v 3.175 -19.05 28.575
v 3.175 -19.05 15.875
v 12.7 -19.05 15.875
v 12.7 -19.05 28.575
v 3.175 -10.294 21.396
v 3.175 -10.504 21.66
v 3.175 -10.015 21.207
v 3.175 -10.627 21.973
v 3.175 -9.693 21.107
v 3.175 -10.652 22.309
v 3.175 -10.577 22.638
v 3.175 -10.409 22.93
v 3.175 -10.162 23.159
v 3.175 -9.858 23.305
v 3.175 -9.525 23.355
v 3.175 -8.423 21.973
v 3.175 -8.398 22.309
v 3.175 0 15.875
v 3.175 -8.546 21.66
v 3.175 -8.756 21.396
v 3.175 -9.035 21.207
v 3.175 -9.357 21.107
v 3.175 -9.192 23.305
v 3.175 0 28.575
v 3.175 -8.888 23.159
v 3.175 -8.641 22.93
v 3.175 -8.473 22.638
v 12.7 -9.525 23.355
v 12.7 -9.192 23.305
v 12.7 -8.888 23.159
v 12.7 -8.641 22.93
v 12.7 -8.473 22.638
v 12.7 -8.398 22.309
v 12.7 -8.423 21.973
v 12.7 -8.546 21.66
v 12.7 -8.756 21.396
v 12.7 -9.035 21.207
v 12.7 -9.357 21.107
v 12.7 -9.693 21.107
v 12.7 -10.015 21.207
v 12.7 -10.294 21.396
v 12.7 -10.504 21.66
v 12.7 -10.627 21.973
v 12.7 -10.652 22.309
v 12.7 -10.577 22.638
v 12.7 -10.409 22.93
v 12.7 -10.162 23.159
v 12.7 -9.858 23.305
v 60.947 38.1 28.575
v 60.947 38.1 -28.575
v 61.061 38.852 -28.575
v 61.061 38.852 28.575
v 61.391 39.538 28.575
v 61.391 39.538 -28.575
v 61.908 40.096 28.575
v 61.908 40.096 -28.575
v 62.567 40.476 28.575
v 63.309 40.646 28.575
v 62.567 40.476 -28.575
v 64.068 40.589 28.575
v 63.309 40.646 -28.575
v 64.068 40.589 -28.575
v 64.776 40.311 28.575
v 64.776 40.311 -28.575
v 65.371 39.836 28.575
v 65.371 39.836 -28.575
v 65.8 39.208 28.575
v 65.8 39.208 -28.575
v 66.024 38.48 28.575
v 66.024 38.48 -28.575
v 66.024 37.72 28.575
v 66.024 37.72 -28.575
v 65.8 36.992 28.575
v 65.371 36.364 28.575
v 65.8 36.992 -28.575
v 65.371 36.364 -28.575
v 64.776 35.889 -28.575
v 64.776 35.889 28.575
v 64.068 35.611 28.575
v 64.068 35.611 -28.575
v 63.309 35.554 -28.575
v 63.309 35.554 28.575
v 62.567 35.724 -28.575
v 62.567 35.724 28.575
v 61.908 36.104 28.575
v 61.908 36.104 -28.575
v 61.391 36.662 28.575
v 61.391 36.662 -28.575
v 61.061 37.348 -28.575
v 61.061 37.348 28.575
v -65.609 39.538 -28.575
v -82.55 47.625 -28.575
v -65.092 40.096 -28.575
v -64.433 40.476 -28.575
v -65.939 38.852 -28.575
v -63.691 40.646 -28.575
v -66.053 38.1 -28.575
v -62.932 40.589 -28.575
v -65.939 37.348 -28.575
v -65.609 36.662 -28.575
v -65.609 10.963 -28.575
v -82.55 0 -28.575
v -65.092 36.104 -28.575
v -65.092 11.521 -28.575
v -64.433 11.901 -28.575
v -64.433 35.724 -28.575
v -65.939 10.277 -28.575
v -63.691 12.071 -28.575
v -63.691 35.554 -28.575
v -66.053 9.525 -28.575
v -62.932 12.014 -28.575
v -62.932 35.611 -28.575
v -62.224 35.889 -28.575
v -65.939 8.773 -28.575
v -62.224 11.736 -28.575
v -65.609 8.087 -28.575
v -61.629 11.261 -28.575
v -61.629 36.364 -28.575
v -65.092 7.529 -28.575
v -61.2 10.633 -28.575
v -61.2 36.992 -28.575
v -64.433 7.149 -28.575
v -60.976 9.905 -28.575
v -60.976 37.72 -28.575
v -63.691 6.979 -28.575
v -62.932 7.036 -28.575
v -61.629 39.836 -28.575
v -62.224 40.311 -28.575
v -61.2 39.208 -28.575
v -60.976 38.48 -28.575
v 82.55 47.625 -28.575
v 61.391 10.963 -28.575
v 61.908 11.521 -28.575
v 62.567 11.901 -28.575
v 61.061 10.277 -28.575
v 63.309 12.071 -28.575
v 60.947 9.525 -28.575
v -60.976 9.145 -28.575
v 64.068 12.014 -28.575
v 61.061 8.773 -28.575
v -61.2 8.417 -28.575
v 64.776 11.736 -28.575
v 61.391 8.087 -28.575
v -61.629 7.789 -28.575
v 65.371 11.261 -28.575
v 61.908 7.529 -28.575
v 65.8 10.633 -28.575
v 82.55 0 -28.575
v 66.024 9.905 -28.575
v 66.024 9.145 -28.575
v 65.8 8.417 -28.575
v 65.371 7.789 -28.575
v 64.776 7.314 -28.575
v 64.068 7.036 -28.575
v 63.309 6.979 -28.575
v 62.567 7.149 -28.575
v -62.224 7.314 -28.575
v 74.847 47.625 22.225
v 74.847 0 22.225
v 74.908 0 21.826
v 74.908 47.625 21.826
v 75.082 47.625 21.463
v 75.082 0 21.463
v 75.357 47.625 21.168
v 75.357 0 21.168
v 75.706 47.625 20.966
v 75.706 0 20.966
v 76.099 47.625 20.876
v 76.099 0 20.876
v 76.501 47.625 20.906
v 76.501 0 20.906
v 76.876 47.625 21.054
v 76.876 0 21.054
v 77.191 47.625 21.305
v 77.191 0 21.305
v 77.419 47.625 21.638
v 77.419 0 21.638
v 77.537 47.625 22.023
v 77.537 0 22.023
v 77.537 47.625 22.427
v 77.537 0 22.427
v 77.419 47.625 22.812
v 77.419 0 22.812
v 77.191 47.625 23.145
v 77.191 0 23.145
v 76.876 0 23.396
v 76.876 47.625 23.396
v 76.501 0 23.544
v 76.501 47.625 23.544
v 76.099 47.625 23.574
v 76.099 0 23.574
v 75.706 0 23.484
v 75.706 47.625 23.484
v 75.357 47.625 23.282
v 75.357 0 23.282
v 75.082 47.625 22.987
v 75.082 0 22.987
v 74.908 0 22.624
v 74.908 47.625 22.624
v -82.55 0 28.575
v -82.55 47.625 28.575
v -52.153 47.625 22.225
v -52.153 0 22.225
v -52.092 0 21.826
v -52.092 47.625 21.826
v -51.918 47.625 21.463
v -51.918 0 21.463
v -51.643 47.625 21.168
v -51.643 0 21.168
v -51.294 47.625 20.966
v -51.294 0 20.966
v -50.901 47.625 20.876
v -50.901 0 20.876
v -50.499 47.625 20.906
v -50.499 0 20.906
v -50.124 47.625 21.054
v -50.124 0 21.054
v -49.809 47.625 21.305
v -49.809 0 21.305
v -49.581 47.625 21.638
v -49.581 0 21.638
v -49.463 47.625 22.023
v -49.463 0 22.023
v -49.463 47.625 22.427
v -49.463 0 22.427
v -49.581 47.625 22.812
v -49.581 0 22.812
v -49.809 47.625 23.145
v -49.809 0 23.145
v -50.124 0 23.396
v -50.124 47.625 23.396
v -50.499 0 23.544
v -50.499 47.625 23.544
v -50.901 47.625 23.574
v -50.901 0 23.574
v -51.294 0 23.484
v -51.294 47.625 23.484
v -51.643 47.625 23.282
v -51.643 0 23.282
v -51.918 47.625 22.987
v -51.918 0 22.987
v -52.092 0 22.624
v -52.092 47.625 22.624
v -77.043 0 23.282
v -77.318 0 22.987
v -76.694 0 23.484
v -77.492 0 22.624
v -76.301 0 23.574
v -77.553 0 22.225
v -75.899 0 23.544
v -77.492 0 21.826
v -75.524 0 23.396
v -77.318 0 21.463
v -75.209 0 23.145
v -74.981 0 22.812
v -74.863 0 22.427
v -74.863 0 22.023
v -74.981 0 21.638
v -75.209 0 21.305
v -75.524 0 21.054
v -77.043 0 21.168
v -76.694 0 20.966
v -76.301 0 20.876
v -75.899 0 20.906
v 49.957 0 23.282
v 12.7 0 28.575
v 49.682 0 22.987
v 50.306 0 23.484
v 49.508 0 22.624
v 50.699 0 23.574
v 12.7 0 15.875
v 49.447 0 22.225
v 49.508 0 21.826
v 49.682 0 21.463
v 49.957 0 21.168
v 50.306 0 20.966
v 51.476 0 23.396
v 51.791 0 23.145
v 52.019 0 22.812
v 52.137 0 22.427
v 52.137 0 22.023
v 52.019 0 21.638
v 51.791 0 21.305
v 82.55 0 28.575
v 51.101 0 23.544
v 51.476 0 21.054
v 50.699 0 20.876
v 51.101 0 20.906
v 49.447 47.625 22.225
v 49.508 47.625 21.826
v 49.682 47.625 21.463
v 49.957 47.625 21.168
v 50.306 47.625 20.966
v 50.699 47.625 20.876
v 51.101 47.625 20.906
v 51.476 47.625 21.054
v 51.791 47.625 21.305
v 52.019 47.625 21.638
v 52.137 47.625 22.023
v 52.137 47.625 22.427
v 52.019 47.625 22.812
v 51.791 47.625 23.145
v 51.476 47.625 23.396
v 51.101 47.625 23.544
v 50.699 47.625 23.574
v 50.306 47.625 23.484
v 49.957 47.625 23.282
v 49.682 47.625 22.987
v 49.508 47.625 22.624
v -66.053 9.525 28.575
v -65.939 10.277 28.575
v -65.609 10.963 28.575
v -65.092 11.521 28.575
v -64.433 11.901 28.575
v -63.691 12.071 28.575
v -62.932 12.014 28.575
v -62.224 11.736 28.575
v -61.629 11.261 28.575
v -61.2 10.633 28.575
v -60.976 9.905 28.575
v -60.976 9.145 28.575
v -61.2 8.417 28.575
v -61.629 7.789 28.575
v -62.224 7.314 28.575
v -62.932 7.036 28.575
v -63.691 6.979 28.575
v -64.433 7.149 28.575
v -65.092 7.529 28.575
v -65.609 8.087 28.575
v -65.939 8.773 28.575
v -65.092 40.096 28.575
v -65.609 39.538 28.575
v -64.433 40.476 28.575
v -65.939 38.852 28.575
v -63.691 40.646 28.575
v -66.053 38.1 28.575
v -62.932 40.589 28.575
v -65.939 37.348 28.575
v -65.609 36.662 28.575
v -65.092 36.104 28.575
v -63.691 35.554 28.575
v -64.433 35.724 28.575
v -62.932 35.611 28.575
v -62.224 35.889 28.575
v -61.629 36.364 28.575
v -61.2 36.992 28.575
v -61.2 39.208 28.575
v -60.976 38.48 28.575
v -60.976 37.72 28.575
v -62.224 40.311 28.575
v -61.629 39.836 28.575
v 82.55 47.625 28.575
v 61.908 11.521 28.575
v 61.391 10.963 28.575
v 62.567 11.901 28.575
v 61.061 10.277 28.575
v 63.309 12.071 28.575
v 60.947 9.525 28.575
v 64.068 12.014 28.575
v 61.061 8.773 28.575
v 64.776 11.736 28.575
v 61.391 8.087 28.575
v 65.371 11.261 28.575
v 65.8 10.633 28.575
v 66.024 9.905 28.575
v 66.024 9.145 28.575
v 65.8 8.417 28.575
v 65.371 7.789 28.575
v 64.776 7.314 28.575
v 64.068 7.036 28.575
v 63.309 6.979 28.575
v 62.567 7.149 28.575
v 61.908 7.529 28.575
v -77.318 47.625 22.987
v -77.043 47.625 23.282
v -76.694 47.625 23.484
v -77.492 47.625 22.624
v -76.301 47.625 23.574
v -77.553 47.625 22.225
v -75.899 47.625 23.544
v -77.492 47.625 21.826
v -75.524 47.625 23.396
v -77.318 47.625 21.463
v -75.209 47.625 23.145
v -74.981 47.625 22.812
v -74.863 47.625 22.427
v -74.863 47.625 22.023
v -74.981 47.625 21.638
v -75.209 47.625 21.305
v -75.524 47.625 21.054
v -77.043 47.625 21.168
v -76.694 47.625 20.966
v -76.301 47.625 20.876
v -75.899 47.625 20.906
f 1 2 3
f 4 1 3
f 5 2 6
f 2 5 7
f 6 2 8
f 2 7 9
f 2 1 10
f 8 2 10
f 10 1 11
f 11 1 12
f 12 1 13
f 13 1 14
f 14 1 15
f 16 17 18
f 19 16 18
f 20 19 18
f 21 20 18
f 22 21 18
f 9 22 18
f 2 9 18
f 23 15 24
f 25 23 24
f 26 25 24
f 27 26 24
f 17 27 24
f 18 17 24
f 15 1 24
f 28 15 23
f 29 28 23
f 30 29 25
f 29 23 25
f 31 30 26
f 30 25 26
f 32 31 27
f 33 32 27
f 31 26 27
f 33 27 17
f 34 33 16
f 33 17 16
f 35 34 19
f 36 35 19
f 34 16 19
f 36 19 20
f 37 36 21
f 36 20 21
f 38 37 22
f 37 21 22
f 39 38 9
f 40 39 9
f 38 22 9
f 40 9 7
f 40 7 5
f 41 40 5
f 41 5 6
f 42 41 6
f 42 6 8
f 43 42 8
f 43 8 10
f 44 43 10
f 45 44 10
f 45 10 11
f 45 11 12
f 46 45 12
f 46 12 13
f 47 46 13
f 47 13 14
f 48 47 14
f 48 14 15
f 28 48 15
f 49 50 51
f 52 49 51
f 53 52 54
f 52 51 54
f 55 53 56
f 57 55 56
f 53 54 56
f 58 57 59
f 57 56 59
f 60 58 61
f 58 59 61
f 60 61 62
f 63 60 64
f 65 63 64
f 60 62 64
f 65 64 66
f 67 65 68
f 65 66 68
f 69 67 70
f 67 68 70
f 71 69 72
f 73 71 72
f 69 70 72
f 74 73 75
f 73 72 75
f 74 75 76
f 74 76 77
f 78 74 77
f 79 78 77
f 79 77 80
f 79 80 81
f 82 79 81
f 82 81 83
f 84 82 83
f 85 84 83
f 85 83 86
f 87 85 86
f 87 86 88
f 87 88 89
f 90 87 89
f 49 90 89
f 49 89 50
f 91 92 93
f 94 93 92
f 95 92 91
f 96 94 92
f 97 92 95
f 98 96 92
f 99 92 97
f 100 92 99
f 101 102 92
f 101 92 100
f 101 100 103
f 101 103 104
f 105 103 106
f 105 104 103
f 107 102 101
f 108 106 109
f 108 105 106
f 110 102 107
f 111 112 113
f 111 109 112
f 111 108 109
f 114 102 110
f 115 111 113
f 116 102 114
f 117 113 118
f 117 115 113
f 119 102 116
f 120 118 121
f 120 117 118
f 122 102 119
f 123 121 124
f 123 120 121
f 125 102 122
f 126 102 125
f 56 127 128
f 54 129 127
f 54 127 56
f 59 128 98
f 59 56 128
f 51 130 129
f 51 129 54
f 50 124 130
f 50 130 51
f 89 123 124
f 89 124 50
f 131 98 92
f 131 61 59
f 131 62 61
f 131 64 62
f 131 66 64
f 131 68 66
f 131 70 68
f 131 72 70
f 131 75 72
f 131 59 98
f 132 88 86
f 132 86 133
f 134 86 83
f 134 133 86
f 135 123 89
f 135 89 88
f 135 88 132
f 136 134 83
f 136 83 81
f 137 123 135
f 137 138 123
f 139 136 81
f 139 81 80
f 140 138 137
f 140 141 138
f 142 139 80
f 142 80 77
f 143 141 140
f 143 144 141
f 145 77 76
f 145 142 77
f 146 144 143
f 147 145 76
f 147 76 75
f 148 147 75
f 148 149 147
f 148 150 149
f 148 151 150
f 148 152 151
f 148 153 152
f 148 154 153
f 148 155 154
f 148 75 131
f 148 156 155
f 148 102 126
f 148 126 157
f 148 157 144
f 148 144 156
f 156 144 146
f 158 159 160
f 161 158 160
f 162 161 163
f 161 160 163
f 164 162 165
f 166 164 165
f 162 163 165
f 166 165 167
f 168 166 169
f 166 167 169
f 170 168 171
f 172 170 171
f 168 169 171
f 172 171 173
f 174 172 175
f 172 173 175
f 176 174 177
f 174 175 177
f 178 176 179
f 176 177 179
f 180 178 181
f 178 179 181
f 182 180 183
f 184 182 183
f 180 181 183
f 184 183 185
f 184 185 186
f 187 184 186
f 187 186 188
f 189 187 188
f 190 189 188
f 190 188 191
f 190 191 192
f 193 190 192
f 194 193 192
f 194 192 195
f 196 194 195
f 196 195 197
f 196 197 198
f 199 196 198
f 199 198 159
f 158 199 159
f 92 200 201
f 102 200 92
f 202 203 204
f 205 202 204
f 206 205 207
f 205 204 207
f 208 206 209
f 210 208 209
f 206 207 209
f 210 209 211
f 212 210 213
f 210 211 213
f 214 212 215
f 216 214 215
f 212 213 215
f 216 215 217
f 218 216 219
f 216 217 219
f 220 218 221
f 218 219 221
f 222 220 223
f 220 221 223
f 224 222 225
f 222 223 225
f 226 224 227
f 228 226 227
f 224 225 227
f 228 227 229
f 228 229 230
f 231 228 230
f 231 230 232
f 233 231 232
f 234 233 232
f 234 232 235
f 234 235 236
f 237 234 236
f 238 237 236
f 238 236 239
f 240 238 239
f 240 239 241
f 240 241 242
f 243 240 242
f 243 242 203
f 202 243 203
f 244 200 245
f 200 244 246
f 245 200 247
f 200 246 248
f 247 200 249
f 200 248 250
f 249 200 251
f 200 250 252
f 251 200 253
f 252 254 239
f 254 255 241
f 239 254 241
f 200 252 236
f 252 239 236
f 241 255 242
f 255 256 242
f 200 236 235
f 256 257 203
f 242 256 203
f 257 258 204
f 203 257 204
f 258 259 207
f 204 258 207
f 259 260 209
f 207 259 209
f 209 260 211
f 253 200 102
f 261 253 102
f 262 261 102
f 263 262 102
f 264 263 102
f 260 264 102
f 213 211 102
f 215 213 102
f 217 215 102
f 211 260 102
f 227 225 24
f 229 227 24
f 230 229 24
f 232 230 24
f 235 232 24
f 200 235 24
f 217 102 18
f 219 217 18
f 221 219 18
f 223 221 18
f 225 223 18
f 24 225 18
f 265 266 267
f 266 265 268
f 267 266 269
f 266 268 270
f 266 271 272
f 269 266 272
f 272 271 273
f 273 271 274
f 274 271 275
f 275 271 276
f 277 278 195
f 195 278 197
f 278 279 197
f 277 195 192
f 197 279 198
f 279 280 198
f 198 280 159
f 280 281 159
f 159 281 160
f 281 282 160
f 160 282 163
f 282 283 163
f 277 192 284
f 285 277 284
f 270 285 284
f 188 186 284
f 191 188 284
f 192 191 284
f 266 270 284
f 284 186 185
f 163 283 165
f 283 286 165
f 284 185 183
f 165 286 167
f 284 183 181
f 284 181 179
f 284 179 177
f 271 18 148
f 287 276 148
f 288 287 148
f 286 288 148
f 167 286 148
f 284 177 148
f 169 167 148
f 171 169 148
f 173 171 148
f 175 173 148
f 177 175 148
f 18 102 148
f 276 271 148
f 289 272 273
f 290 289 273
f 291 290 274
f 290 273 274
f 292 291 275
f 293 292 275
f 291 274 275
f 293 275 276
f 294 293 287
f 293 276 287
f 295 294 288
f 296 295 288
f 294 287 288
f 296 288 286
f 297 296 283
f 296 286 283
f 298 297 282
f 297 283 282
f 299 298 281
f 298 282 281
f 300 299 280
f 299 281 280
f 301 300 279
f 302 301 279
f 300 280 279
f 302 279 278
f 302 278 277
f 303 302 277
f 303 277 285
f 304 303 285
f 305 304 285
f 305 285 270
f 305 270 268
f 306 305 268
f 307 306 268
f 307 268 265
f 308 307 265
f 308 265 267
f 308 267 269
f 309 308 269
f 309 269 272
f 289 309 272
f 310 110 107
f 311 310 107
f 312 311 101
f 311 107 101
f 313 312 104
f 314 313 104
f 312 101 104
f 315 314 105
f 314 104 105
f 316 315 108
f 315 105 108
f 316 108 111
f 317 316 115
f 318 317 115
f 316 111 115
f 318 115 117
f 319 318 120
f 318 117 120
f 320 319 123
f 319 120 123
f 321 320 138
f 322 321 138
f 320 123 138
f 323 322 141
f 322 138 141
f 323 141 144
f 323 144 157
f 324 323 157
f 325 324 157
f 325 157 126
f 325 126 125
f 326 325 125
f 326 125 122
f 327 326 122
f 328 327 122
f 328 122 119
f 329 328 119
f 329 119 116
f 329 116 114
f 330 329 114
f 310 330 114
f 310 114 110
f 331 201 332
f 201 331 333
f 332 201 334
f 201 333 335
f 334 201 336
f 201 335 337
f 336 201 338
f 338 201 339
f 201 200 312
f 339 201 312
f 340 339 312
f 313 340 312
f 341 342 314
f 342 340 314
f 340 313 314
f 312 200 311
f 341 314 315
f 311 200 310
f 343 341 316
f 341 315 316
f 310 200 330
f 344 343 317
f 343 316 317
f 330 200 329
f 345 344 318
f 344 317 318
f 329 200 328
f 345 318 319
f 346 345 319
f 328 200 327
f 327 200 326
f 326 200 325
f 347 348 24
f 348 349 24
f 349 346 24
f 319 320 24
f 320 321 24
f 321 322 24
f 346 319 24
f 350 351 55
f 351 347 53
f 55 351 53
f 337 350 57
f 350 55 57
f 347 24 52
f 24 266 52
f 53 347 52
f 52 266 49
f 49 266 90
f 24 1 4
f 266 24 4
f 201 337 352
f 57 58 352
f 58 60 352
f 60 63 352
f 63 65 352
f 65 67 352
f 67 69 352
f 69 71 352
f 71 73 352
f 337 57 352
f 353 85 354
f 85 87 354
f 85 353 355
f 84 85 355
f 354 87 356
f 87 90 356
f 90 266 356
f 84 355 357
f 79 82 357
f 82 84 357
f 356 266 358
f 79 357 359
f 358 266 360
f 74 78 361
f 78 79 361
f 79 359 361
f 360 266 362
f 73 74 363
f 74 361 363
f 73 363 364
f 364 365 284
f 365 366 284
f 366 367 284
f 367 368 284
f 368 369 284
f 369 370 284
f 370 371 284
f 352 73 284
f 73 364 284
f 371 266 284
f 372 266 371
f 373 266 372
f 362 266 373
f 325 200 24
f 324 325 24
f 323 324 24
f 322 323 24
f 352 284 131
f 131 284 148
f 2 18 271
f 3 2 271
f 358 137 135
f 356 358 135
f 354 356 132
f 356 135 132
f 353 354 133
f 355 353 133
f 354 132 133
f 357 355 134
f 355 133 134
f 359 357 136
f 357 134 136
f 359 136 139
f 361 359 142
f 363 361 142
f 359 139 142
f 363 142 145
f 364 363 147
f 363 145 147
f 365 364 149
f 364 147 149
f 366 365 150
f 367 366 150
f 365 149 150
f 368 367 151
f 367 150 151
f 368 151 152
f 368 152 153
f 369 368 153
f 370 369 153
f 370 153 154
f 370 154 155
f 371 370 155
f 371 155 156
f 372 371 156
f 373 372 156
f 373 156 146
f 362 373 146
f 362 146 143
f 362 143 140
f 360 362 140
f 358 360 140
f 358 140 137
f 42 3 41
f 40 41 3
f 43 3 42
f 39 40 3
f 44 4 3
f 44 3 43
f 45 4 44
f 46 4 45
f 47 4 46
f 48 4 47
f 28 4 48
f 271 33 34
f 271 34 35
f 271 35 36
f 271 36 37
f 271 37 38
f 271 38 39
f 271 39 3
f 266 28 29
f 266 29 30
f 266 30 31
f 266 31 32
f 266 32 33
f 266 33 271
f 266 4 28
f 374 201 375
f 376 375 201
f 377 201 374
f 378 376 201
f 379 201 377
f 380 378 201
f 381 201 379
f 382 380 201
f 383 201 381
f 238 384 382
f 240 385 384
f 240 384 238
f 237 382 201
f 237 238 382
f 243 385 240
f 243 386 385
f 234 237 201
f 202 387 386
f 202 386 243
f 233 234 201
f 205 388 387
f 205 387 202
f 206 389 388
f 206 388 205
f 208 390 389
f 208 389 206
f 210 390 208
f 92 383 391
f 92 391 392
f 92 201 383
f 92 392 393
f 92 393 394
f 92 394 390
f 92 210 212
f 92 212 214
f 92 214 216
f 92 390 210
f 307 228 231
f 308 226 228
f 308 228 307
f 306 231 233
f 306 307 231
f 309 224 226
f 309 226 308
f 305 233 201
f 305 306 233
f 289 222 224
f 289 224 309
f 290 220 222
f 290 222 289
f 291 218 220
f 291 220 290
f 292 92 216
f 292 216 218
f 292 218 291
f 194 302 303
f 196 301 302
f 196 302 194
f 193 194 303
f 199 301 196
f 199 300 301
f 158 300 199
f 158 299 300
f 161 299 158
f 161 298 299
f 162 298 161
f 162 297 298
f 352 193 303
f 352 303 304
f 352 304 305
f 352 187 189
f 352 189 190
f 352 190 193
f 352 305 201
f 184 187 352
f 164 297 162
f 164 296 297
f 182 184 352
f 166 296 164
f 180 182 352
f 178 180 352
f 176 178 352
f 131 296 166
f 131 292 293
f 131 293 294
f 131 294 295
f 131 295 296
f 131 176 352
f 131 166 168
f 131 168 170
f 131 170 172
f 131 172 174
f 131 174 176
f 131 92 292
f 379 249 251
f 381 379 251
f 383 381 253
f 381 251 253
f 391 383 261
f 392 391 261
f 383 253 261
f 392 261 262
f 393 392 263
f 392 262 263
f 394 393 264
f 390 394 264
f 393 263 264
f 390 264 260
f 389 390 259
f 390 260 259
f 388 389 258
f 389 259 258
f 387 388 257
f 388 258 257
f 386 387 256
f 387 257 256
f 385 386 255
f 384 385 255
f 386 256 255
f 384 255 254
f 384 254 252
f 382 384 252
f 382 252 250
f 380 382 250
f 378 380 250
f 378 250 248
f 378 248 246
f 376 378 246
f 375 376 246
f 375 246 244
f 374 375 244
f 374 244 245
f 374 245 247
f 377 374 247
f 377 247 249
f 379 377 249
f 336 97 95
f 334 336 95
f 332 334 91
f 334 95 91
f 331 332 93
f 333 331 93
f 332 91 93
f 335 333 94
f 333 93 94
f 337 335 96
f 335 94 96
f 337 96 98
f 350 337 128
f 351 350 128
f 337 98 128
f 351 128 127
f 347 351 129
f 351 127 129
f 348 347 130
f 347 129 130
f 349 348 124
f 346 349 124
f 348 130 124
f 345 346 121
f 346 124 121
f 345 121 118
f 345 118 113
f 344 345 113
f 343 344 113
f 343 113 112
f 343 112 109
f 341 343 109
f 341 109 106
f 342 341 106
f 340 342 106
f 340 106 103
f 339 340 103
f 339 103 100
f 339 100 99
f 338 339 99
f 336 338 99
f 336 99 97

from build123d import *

# Parameters (mm, degrees)
SKETCH1_W               = 165.1
SKETCH1_H               = 57.15
BOSS_EXTRUDE1_DEPTH     = 47.625
SKETCH6_W               = 9.525
SKETCH6_H               = 19.05
BOSS_EXTRUDE2_DEPTH     = 12.7
F_4_40_TAPPED_HOLE1_D   = 2.2606
F_1_4_20_TAPPED_HOLE1_D = 5.1054
F_6_32_TAPPED_HOLE1_D   = 2.7051


with BuildPart() as part:
    # Sketch1 → Boss-Extrude1 (new body)
    with BuildSketch(Plane(origin=(0, 0, 0), x_dir=(1, 0, 0), z_dir=(0, 1, 0))):
        Rectangle(SKETCH1_W, SKETCH1_H)
    extrude(amount=BOSS_EXTRUDE1_DEPTH)

    # Sketch6 → Boss-Extrude2 (add)
    with BuildSketch(Plane.XY.offset(28.575)):
        with Locations((7.9375, -9.525)):
            Rectangle(SKETCH6_W, SKETCH6_H)
    extrude(amount=-BOSS_EXTRUDE2_DEPTH)

    # #4-40 Tapped Hole1 (through all)
    with Locations(Plane(origin=(12.7, 0, 0), x_dir=(0, 0, -1), z_dir=(1, 0, 0))):
        with Locations((-22.225, -9.525)):
            Hole(F_4_40_TAPPED_HOLE1_D / 2)

    # 1/4-20 Tapped Hole1 (through all)
    with Locations(Plane.XY.offset(28.575)):
        with Locations((-63.5, 38.1), (-63.5, 9.525), (63.5, 38.1), (63.5, 9.525)):
            Hole(F_1_4_20_TAPPED_HOLE1_D / 2)

    # #6-32 Tapped Hole1 (through all)
    with Locations(Plane(origin=(0, 47.625, 0), x_dir=(1, 0, 0), z_dir=(0, 1, 0))):
        with Locations((-76.2, -22.225), (-50.8, -22.225), (50.8, -22.225), (76.2, -22.225)):
            Hole(F_6_32_TAPPED_HOLE1_D / 2)


solid = part.part
